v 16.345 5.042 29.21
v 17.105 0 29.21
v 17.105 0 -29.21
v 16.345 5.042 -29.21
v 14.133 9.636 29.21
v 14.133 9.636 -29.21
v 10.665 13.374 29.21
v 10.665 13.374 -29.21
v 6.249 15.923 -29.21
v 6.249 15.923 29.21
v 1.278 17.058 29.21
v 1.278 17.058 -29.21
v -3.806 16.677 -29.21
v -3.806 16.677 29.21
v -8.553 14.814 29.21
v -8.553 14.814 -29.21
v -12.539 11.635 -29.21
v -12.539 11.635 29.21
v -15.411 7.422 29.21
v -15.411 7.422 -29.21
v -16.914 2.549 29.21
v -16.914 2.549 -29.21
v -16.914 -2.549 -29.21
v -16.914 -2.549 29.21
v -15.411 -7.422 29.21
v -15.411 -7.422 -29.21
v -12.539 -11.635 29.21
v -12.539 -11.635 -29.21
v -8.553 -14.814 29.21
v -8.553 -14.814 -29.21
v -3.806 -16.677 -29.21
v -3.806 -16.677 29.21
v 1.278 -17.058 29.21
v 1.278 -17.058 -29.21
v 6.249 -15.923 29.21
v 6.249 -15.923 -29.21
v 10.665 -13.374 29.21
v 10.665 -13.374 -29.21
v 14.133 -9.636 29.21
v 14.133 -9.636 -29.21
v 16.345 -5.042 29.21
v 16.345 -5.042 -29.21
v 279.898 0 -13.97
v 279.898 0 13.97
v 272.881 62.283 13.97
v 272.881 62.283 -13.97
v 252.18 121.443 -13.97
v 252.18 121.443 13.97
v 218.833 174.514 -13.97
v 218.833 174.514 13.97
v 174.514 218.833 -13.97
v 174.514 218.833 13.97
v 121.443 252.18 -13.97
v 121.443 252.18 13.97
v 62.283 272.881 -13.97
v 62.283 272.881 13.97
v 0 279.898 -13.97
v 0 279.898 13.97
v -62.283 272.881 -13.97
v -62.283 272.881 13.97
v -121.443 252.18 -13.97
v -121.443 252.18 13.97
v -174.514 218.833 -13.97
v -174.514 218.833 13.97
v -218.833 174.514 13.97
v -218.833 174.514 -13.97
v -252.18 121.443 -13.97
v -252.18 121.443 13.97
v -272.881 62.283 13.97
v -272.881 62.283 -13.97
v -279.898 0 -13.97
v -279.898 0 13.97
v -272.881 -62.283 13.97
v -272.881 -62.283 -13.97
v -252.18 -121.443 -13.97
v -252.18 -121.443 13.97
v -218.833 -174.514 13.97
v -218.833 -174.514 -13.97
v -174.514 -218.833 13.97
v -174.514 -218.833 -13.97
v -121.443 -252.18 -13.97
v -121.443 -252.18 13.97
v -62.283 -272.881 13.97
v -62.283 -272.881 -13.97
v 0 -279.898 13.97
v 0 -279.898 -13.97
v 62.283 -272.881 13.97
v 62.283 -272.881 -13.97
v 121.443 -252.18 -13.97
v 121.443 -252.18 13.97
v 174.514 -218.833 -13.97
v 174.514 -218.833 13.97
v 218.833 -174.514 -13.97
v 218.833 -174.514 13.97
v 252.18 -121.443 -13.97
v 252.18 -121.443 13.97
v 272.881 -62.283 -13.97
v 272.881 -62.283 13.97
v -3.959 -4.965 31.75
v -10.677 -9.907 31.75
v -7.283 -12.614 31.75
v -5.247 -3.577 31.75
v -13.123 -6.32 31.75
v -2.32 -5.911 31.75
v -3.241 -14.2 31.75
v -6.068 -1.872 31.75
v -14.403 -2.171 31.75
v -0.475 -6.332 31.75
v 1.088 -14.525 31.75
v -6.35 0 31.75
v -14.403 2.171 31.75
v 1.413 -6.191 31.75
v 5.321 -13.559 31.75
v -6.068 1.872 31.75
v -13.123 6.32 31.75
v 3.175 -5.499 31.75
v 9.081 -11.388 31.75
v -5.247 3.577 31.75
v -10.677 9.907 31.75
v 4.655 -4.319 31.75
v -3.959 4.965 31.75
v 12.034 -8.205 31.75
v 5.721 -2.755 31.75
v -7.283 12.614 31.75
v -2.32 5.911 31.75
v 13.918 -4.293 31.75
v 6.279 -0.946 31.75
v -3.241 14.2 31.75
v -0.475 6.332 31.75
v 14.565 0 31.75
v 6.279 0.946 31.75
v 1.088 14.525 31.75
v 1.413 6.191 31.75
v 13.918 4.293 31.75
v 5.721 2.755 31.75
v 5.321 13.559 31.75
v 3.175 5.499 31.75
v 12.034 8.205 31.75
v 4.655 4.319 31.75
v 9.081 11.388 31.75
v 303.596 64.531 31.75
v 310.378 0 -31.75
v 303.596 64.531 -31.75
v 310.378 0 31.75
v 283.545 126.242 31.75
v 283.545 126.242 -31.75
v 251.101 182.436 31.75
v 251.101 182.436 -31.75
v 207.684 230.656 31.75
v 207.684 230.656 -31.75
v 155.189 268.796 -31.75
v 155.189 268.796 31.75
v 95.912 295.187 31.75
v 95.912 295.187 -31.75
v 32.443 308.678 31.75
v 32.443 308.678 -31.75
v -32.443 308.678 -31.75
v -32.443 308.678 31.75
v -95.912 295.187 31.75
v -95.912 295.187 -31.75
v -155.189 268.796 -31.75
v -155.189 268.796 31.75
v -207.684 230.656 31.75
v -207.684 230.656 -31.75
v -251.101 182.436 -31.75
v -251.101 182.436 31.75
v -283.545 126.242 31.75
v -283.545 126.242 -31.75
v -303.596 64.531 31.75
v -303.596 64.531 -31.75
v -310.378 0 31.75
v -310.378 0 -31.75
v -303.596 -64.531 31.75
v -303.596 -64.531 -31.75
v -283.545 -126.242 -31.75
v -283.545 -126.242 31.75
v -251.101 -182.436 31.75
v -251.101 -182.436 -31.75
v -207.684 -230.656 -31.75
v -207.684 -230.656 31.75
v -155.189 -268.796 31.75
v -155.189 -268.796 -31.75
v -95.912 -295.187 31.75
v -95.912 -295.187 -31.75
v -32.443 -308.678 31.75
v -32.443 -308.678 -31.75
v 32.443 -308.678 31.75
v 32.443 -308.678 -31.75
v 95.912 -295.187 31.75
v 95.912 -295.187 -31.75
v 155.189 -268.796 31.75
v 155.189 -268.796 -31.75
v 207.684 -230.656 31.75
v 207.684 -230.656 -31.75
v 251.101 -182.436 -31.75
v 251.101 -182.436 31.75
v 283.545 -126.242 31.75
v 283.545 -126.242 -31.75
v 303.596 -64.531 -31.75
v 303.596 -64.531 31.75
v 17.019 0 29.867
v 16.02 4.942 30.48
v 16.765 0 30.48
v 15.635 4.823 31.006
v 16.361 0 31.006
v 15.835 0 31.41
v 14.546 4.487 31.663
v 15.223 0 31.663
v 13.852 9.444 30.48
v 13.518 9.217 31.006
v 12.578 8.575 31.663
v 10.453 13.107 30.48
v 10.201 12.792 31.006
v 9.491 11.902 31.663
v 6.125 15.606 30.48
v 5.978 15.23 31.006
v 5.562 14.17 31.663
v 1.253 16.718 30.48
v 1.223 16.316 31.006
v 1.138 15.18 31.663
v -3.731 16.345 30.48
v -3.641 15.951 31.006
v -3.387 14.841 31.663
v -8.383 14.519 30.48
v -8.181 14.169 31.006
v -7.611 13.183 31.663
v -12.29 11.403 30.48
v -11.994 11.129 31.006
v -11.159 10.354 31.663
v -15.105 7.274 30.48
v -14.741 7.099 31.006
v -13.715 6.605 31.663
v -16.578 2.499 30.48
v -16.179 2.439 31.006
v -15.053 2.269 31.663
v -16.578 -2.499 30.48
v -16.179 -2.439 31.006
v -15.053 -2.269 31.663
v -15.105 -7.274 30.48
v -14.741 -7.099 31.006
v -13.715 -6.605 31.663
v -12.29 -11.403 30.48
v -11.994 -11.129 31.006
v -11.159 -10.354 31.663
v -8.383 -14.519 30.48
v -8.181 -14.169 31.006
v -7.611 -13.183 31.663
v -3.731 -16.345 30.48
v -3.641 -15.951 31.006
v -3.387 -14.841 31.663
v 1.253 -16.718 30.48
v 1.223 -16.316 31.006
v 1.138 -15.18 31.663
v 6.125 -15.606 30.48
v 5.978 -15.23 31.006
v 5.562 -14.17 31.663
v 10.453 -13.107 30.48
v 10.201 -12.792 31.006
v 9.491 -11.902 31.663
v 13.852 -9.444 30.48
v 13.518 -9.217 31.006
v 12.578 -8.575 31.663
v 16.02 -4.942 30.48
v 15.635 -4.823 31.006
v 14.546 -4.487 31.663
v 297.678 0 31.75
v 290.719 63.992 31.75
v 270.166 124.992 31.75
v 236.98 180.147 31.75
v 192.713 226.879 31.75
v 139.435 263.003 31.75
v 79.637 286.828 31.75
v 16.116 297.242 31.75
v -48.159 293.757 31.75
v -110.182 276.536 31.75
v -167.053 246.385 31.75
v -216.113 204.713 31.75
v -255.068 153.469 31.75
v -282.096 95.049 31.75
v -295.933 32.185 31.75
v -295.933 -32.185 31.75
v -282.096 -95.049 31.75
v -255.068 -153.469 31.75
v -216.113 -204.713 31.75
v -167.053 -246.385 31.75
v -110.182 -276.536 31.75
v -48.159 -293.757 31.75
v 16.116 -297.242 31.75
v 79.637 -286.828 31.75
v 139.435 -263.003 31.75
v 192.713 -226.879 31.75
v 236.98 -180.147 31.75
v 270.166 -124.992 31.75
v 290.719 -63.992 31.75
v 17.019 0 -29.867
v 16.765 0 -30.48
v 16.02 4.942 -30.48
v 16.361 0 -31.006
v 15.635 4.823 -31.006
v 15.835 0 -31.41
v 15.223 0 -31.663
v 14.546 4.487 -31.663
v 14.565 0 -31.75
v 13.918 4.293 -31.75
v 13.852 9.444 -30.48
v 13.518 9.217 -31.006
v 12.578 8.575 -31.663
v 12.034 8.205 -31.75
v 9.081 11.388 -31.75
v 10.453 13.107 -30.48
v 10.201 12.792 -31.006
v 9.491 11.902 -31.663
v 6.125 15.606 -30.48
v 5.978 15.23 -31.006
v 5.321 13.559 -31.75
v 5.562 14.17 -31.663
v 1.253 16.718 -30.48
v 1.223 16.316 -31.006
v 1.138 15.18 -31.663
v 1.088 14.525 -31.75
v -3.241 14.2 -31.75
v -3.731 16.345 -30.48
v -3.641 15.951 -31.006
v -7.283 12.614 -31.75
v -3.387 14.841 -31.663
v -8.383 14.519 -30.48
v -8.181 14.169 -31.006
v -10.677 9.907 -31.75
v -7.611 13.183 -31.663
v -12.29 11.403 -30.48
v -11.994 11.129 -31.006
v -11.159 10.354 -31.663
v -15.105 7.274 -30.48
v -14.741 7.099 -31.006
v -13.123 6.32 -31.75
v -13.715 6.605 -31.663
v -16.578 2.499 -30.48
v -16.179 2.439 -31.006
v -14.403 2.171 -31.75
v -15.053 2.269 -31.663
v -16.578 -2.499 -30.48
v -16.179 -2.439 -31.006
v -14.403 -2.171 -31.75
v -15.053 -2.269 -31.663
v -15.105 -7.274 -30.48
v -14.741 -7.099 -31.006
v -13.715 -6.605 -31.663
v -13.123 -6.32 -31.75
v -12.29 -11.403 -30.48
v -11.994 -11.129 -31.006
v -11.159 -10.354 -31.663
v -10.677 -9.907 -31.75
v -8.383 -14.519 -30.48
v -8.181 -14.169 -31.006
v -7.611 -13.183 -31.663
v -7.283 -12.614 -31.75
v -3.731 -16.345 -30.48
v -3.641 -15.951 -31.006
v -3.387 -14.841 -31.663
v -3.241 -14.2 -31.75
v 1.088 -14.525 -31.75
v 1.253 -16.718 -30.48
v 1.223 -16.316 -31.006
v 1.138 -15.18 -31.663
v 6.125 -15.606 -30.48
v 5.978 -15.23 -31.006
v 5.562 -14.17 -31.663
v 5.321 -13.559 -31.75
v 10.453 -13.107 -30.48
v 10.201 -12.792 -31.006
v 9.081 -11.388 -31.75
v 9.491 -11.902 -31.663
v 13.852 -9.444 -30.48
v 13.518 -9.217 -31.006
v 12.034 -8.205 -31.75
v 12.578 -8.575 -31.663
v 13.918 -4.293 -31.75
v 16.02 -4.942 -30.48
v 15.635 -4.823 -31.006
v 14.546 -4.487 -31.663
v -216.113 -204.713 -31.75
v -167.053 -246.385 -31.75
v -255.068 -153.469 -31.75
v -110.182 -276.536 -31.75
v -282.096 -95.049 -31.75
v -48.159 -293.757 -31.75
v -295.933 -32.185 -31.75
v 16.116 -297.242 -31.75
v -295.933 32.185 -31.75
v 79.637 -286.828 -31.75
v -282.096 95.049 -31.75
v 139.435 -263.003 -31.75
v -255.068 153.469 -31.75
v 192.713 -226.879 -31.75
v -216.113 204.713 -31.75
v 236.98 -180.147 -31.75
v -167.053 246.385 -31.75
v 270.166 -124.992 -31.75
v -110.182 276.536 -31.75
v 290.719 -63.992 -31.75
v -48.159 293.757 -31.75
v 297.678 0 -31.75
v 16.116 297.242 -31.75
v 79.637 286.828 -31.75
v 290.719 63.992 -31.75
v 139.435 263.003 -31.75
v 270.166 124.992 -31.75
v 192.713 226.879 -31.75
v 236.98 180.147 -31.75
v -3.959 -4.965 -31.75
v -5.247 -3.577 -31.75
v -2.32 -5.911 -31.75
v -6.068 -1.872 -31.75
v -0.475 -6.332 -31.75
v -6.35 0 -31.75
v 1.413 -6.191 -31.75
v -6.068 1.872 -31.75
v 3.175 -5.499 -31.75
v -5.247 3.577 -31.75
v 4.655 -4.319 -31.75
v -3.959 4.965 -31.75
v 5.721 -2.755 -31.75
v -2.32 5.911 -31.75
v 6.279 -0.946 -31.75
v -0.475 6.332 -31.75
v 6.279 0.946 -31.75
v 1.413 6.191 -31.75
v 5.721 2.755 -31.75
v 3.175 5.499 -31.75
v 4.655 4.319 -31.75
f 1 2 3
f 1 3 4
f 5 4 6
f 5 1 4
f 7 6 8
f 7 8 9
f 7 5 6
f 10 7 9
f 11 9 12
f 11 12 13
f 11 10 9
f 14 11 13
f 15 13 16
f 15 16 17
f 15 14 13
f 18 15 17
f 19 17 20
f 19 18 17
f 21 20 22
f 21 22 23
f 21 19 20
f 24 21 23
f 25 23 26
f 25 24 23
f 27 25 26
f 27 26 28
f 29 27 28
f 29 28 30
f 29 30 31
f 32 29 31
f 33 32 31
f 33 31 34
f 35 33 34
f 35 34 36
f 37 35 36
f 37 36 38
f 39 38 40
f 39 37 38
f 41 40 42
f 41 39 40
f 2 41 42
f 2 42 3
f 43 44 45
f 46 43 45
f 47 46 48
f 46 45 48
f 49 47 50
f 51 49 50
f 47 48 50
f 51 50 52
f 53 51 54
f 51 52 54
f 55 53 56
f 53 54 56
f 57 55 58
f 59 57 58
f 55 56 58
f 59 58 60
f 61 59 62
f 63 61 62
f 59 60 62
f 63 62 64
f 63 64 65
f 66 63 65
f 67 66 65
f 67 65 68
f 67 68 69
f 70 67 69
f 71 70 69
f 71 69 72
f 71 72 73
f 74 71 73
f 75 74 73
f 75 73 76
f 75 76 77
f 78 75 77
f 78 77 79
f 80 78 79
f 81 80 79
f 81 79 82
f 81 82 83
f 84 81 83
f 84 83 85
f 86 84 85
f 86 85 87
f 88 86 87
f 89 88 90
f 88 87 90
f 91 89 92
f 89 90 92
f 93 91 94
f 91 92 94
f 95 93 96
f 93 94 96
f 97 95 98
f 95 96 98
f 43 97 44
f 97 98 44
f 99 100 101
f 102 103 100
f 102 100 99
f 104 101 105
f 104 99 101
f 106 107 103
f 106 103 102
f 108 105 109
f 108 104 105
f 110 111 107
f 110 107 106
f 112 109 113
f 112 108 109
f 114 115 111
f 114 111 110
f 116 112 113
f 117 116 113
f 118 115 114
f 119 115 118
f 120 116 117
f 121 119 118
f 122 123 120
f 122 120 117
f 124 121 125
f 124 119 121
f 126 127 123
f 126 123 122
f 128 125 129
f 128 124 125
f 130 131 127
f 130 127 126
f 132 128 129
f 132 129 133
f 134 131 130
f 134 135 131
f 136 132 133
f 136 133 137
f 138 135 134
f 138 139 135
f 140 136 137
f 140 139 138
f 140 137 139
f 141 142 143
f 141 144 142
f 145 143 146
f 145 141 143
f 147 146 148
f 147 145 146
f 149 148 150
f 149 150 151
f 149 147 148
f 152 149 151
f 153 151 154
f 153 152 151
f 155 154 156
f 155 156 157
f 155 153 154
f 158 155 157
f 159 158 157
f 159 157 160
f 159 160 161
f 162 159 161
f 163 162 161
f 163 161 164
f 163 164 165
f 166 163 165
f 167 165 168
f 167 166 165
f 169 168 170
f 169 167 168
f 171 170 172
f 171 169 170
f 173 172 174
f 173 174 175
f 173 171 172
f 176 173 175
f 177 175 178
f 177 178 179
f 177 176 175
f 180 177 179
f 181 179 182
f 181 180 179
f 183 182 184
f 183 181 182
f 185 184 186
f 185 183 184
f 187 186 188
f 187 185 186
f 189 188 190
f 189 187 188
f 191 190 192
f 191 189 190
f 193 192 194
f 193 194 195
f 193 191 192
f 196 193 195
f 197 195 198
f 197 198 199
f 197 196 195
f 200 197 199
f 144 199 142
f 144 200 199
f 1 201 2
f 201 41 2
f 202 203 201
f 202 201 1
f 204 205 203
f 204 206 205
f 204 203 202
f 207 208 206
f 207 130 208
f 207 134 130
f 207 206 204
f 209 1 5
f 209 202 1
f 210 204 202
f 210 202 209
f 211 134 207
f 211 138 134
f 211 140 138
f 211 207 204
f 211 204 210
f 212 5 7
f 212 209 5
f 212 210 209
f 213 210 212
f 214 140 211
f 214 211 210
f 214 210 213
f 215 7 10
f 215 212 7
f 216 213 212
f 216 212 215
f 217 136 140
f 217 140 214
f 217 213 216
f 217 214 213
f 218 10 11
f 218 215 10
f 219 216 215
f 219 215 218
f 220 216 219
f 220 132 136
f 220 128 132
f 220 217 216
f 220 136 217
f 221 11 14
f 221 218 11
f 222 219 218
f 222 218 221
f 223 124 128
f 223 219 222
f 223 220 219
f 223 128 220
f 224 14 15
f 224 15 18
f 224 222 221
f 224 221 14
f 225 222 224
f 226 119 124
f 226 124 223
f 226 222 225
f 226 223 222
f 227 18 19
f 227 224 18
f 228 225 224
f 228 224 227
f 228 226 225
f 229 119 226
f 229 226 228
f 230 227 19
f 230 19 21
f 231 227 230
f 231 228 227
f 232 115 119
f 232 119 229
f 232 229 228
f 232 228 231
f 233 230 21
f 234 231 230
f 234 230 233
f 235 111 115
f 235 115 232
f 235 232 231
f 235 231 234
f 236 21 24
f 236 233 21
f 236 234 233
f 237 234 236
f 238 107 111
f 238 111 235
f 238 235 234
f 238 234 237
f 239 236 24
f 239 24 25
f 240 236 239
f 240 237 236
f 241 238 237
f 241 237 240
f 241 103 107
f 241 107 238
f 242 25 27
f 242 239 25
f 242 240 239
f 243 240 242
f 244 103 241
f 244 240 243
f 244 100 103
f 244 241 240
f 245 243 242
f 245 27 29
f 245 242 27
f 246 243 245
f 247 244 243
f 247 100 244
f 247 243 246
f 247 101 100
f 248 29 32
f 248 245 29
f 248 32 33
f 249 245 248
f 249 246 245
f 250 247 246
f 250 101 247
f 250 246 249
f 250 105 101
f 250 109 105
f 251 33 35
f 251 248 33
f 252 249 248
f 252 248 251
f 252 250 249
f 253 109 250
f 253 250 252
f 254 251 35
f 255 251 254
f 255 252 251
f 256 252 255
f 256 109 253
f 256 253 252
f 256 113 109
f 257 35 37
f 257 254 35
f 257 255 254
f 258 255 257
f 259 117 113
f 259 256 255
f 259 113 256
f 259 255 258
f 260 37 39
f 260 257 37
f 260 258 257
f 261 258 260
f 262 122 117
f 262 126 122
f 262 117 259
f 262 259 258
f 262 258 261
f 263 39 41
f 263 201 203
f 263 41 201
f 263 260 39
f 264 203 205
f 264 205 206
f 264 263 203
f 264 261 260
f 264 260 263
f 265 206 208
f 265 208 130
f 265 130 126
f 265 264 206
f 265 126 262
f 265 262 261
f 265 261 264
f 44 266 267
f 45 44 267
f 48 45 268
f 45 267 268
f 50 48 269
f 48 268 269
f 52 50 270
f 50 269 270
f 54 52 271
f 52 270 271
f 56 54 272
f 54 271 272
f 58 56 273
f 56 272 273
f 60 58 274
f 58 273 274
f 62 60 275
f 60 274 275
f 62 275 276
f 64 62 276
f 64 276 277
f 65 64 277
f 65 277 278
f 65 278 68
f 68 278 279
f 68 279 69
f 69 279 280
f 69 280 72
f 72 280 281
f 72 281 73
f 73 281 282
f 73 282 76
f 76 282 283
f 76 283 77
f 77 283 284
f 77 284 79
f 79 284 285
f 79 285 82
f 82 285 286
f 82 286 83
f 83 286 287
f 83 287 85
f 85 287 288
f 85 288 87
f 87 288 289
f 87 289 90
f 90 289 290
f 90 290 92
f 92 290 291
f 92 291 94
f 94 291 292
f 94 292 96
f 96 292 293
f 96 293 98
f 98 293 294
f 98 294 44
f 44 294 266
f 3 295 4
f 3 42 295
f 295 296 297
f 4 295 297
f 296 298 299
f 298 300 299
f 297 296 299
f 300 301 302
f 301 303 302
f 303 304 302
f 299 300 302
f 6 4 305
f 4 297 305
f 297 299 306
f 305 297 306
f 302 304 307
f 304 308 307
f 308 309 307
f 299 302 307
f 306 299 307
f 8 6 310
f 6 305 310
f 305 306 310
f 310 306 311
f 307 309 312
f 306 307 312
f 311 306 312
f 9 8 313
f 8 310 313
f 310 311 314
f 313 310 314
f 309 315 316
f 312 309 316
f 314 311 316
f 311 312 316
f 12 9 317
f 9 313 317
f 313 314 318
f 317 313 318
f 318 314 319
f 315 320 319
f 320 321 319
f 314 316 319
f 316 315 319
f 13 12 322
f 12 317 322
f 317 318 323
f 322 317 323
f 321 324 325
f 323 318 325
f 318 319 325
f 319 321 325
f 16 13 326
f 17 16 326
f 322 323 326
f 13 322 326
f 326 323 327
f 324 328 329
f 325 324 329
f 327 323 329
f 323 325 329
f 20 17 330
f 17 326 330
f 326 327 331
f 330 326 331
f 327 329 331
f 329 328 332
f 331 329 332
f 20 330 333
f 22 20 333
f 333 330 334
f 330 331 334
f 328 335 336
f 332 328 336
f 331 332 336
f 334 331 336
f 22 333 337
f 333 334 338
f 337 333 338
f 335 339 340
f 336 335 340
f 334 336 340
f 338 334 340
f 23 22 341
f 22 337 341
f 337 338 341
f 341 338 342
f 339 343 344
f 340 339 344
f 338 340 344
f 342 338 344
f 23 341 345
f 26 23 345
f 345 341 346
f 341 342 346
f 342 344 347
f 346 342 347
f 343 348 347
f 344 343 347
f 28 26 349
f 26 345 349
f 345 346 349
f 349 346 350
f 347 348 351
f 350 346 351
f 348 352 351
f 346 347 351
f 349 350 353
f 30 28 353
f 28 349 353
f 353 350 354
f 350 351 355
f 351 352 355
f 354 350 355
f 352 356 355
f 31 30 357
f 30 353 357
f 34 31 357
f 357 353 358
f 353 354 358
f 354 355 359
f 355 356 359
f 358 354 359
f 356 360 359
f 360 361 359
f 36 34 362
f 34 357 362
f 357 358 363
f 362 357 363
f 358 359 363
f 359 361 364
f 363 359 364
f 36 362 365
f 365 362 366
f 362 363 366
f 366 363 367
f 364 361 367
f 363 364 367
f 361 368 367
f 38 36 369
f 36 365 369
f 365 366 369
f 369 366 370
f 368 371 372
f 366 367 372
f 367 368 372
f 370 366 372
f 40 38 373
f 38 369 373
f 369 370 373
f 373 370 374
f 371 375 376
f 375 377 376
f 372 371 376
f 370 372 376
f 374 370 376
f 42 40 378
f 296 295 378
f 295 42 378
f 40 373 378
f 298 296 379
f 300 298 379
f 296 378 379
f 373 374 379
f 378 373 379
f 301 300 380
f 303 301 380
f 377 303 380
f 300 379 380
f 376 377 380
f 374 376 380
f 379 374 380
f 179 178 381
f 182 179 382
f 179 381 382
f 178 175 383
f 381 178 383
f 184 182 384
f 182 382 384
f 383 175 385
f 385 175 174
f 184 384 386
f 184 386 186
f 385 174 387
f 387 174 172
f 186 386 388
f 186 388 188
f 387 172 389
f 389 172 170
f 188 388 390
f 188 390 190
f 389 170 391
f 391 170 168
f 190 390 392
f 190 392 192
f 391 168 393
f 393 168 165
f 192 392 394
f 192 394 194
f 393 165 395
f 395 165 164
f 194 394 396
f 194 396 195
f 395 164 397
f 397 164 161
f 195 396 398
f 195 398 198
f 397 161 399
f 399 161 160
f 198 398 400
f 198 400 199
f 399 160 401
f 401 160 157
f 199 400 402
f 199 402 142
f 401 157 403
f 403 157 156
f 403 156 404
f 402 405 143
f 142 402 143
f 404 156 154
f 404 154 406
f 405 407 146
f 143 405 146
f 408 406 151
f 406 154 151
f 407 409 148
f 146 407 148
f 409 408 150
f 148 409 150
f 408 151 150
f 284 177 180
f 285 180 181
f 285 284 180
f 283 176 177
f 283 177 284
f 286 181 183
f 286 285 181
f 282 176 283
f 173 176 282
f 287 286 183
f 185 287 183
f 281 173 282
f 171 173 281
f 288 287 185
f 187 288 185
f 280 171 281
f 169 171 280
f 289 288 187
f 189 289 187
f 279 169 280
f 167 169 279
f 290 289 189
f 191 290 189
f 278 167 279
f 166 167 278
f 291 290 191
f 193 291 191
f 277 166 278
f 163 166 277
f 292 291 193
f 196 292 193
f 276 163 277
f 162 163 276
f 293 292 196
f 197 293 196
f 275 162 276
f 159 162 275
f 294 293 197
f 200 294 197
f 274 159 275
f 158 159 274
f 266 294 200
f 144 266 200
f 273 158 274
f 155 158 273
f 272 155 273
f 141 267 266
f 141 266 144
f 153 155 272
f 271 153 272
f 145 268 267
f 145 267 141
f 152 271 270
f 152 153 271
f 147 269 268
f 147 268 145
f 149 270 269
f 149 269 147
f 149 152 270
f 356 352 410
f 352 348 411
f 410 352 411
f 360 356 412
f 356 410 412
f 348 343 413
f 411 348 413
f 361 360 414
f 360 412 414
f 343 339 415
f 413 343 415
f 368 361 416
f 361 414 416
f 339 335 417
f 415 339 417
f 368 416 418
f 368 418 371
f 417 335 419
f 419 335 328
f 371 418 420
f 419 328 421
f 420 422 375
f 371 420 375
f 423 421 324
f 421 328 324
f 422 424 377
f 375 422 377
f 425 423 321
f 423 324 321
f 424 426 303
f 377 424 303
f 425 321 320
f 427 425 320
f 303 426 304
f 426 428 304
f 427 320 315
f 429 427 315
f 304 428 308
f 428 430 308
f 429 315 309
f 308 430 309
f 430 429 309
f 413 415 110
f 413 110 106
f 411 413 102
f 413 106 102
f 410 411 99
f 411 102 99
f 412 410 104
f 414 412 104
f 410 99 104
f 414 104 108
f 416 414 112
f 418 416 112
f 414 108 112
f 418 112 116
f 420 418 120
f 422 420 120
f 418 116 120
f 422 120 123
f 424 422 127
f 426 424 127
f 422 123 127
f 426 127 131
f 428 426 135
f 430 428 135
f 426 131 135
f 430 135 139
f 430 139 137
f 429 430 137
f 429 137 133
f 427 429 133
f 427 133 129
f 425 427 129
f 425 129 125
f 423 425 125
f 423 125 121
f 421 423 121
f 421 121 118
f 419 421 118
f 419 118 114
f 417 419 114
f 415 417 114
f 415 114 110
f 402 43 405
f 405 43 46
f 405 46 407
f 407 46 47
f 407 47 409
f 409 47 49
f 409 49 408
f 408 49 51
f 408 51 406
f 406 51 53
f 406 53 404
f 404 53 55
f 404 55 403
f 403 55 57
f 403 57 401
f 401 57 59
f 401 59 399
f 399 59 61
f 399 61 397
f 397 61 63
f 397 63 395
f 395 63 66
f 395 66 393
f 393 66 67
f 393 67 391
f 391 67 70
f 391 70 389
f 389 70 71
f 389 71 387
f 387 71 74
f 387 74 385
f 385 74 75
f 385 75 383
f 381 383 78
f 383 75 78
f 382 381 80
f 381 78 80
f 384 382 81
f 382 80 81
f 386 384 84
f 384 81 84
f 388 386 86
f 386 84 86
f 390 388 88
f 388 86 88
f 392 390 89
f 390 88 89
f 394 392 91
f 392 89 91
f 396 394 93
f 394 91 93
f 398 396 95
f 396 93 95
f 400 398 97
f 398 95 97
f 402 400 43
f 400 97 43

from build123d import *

# Parameters (mm, degrees)
F0_R     = 310.378453622
F1_DEPTH = 31.75
F3_T     = -30.4799746
F2_R     = 17.1053876609
F4_DEPTH = 63.5
F5_R     = 2.54
F9_SIZE  = 17.78
F11_D    = 12.7


# Not quite as in the source:
# - a feature of the source that left no trace in its solid (it failed there, or was rolled back) is left out
# - the program builds the solid bodies; features that only make, move or delete a surface that nothing else refers to are left out


with BuildPart() as f1:
    # F0 (on Top) → F1 (new body, symmetric)
    with BuildSketch(Plane.XY):
        Circle(F0_R)
    extrude(amount=F1_DEPTH, both=True)

    # F3
    f3_openings = [f1.faces().sort_by_distance(p)[0] for p in [
        (0, 0, 31.75),
        (0, 0, -31.75),
    ]]
    offset(amount=F3_T, openings=f3_openings)

    # F9
    f9_edges = [f1.edges().sort_by_distance(p)[0] for p in [
        (-279.898479, 0, -31.75),
        (-279.898479, 0, 31.75),
    ]]
    chamfer(f9_edges, length=F9_SIZE)


with BuildPart() as f4:
    # F2 (on face) → F4 (new body)
    with BuildSketch(Plane.XY.offset(31.75)):
        Circle(F2_R)
    extrude(amount=-F4_DEPTH)

    # F5
    f5_edges = [f4.edges().sort_by_distance(p)[0] for p in [
        (17.105388, 0, 0),
        (-17.105388, 0, 31.75),
        (-17.105388, 0, -31.75),
    ]]
    fillet(f5_edges, radius=F5_R)

    # F11 (through all)
    with Locations(Plane(origin=(0, 0, -31.75), x_dir=(1, 0, 0), z_dir=(0, 0, -1))):
        with Locations((0, 0)):
            Hole(F11_D / 2)


solid = Compound([f1.part, f4.part])
